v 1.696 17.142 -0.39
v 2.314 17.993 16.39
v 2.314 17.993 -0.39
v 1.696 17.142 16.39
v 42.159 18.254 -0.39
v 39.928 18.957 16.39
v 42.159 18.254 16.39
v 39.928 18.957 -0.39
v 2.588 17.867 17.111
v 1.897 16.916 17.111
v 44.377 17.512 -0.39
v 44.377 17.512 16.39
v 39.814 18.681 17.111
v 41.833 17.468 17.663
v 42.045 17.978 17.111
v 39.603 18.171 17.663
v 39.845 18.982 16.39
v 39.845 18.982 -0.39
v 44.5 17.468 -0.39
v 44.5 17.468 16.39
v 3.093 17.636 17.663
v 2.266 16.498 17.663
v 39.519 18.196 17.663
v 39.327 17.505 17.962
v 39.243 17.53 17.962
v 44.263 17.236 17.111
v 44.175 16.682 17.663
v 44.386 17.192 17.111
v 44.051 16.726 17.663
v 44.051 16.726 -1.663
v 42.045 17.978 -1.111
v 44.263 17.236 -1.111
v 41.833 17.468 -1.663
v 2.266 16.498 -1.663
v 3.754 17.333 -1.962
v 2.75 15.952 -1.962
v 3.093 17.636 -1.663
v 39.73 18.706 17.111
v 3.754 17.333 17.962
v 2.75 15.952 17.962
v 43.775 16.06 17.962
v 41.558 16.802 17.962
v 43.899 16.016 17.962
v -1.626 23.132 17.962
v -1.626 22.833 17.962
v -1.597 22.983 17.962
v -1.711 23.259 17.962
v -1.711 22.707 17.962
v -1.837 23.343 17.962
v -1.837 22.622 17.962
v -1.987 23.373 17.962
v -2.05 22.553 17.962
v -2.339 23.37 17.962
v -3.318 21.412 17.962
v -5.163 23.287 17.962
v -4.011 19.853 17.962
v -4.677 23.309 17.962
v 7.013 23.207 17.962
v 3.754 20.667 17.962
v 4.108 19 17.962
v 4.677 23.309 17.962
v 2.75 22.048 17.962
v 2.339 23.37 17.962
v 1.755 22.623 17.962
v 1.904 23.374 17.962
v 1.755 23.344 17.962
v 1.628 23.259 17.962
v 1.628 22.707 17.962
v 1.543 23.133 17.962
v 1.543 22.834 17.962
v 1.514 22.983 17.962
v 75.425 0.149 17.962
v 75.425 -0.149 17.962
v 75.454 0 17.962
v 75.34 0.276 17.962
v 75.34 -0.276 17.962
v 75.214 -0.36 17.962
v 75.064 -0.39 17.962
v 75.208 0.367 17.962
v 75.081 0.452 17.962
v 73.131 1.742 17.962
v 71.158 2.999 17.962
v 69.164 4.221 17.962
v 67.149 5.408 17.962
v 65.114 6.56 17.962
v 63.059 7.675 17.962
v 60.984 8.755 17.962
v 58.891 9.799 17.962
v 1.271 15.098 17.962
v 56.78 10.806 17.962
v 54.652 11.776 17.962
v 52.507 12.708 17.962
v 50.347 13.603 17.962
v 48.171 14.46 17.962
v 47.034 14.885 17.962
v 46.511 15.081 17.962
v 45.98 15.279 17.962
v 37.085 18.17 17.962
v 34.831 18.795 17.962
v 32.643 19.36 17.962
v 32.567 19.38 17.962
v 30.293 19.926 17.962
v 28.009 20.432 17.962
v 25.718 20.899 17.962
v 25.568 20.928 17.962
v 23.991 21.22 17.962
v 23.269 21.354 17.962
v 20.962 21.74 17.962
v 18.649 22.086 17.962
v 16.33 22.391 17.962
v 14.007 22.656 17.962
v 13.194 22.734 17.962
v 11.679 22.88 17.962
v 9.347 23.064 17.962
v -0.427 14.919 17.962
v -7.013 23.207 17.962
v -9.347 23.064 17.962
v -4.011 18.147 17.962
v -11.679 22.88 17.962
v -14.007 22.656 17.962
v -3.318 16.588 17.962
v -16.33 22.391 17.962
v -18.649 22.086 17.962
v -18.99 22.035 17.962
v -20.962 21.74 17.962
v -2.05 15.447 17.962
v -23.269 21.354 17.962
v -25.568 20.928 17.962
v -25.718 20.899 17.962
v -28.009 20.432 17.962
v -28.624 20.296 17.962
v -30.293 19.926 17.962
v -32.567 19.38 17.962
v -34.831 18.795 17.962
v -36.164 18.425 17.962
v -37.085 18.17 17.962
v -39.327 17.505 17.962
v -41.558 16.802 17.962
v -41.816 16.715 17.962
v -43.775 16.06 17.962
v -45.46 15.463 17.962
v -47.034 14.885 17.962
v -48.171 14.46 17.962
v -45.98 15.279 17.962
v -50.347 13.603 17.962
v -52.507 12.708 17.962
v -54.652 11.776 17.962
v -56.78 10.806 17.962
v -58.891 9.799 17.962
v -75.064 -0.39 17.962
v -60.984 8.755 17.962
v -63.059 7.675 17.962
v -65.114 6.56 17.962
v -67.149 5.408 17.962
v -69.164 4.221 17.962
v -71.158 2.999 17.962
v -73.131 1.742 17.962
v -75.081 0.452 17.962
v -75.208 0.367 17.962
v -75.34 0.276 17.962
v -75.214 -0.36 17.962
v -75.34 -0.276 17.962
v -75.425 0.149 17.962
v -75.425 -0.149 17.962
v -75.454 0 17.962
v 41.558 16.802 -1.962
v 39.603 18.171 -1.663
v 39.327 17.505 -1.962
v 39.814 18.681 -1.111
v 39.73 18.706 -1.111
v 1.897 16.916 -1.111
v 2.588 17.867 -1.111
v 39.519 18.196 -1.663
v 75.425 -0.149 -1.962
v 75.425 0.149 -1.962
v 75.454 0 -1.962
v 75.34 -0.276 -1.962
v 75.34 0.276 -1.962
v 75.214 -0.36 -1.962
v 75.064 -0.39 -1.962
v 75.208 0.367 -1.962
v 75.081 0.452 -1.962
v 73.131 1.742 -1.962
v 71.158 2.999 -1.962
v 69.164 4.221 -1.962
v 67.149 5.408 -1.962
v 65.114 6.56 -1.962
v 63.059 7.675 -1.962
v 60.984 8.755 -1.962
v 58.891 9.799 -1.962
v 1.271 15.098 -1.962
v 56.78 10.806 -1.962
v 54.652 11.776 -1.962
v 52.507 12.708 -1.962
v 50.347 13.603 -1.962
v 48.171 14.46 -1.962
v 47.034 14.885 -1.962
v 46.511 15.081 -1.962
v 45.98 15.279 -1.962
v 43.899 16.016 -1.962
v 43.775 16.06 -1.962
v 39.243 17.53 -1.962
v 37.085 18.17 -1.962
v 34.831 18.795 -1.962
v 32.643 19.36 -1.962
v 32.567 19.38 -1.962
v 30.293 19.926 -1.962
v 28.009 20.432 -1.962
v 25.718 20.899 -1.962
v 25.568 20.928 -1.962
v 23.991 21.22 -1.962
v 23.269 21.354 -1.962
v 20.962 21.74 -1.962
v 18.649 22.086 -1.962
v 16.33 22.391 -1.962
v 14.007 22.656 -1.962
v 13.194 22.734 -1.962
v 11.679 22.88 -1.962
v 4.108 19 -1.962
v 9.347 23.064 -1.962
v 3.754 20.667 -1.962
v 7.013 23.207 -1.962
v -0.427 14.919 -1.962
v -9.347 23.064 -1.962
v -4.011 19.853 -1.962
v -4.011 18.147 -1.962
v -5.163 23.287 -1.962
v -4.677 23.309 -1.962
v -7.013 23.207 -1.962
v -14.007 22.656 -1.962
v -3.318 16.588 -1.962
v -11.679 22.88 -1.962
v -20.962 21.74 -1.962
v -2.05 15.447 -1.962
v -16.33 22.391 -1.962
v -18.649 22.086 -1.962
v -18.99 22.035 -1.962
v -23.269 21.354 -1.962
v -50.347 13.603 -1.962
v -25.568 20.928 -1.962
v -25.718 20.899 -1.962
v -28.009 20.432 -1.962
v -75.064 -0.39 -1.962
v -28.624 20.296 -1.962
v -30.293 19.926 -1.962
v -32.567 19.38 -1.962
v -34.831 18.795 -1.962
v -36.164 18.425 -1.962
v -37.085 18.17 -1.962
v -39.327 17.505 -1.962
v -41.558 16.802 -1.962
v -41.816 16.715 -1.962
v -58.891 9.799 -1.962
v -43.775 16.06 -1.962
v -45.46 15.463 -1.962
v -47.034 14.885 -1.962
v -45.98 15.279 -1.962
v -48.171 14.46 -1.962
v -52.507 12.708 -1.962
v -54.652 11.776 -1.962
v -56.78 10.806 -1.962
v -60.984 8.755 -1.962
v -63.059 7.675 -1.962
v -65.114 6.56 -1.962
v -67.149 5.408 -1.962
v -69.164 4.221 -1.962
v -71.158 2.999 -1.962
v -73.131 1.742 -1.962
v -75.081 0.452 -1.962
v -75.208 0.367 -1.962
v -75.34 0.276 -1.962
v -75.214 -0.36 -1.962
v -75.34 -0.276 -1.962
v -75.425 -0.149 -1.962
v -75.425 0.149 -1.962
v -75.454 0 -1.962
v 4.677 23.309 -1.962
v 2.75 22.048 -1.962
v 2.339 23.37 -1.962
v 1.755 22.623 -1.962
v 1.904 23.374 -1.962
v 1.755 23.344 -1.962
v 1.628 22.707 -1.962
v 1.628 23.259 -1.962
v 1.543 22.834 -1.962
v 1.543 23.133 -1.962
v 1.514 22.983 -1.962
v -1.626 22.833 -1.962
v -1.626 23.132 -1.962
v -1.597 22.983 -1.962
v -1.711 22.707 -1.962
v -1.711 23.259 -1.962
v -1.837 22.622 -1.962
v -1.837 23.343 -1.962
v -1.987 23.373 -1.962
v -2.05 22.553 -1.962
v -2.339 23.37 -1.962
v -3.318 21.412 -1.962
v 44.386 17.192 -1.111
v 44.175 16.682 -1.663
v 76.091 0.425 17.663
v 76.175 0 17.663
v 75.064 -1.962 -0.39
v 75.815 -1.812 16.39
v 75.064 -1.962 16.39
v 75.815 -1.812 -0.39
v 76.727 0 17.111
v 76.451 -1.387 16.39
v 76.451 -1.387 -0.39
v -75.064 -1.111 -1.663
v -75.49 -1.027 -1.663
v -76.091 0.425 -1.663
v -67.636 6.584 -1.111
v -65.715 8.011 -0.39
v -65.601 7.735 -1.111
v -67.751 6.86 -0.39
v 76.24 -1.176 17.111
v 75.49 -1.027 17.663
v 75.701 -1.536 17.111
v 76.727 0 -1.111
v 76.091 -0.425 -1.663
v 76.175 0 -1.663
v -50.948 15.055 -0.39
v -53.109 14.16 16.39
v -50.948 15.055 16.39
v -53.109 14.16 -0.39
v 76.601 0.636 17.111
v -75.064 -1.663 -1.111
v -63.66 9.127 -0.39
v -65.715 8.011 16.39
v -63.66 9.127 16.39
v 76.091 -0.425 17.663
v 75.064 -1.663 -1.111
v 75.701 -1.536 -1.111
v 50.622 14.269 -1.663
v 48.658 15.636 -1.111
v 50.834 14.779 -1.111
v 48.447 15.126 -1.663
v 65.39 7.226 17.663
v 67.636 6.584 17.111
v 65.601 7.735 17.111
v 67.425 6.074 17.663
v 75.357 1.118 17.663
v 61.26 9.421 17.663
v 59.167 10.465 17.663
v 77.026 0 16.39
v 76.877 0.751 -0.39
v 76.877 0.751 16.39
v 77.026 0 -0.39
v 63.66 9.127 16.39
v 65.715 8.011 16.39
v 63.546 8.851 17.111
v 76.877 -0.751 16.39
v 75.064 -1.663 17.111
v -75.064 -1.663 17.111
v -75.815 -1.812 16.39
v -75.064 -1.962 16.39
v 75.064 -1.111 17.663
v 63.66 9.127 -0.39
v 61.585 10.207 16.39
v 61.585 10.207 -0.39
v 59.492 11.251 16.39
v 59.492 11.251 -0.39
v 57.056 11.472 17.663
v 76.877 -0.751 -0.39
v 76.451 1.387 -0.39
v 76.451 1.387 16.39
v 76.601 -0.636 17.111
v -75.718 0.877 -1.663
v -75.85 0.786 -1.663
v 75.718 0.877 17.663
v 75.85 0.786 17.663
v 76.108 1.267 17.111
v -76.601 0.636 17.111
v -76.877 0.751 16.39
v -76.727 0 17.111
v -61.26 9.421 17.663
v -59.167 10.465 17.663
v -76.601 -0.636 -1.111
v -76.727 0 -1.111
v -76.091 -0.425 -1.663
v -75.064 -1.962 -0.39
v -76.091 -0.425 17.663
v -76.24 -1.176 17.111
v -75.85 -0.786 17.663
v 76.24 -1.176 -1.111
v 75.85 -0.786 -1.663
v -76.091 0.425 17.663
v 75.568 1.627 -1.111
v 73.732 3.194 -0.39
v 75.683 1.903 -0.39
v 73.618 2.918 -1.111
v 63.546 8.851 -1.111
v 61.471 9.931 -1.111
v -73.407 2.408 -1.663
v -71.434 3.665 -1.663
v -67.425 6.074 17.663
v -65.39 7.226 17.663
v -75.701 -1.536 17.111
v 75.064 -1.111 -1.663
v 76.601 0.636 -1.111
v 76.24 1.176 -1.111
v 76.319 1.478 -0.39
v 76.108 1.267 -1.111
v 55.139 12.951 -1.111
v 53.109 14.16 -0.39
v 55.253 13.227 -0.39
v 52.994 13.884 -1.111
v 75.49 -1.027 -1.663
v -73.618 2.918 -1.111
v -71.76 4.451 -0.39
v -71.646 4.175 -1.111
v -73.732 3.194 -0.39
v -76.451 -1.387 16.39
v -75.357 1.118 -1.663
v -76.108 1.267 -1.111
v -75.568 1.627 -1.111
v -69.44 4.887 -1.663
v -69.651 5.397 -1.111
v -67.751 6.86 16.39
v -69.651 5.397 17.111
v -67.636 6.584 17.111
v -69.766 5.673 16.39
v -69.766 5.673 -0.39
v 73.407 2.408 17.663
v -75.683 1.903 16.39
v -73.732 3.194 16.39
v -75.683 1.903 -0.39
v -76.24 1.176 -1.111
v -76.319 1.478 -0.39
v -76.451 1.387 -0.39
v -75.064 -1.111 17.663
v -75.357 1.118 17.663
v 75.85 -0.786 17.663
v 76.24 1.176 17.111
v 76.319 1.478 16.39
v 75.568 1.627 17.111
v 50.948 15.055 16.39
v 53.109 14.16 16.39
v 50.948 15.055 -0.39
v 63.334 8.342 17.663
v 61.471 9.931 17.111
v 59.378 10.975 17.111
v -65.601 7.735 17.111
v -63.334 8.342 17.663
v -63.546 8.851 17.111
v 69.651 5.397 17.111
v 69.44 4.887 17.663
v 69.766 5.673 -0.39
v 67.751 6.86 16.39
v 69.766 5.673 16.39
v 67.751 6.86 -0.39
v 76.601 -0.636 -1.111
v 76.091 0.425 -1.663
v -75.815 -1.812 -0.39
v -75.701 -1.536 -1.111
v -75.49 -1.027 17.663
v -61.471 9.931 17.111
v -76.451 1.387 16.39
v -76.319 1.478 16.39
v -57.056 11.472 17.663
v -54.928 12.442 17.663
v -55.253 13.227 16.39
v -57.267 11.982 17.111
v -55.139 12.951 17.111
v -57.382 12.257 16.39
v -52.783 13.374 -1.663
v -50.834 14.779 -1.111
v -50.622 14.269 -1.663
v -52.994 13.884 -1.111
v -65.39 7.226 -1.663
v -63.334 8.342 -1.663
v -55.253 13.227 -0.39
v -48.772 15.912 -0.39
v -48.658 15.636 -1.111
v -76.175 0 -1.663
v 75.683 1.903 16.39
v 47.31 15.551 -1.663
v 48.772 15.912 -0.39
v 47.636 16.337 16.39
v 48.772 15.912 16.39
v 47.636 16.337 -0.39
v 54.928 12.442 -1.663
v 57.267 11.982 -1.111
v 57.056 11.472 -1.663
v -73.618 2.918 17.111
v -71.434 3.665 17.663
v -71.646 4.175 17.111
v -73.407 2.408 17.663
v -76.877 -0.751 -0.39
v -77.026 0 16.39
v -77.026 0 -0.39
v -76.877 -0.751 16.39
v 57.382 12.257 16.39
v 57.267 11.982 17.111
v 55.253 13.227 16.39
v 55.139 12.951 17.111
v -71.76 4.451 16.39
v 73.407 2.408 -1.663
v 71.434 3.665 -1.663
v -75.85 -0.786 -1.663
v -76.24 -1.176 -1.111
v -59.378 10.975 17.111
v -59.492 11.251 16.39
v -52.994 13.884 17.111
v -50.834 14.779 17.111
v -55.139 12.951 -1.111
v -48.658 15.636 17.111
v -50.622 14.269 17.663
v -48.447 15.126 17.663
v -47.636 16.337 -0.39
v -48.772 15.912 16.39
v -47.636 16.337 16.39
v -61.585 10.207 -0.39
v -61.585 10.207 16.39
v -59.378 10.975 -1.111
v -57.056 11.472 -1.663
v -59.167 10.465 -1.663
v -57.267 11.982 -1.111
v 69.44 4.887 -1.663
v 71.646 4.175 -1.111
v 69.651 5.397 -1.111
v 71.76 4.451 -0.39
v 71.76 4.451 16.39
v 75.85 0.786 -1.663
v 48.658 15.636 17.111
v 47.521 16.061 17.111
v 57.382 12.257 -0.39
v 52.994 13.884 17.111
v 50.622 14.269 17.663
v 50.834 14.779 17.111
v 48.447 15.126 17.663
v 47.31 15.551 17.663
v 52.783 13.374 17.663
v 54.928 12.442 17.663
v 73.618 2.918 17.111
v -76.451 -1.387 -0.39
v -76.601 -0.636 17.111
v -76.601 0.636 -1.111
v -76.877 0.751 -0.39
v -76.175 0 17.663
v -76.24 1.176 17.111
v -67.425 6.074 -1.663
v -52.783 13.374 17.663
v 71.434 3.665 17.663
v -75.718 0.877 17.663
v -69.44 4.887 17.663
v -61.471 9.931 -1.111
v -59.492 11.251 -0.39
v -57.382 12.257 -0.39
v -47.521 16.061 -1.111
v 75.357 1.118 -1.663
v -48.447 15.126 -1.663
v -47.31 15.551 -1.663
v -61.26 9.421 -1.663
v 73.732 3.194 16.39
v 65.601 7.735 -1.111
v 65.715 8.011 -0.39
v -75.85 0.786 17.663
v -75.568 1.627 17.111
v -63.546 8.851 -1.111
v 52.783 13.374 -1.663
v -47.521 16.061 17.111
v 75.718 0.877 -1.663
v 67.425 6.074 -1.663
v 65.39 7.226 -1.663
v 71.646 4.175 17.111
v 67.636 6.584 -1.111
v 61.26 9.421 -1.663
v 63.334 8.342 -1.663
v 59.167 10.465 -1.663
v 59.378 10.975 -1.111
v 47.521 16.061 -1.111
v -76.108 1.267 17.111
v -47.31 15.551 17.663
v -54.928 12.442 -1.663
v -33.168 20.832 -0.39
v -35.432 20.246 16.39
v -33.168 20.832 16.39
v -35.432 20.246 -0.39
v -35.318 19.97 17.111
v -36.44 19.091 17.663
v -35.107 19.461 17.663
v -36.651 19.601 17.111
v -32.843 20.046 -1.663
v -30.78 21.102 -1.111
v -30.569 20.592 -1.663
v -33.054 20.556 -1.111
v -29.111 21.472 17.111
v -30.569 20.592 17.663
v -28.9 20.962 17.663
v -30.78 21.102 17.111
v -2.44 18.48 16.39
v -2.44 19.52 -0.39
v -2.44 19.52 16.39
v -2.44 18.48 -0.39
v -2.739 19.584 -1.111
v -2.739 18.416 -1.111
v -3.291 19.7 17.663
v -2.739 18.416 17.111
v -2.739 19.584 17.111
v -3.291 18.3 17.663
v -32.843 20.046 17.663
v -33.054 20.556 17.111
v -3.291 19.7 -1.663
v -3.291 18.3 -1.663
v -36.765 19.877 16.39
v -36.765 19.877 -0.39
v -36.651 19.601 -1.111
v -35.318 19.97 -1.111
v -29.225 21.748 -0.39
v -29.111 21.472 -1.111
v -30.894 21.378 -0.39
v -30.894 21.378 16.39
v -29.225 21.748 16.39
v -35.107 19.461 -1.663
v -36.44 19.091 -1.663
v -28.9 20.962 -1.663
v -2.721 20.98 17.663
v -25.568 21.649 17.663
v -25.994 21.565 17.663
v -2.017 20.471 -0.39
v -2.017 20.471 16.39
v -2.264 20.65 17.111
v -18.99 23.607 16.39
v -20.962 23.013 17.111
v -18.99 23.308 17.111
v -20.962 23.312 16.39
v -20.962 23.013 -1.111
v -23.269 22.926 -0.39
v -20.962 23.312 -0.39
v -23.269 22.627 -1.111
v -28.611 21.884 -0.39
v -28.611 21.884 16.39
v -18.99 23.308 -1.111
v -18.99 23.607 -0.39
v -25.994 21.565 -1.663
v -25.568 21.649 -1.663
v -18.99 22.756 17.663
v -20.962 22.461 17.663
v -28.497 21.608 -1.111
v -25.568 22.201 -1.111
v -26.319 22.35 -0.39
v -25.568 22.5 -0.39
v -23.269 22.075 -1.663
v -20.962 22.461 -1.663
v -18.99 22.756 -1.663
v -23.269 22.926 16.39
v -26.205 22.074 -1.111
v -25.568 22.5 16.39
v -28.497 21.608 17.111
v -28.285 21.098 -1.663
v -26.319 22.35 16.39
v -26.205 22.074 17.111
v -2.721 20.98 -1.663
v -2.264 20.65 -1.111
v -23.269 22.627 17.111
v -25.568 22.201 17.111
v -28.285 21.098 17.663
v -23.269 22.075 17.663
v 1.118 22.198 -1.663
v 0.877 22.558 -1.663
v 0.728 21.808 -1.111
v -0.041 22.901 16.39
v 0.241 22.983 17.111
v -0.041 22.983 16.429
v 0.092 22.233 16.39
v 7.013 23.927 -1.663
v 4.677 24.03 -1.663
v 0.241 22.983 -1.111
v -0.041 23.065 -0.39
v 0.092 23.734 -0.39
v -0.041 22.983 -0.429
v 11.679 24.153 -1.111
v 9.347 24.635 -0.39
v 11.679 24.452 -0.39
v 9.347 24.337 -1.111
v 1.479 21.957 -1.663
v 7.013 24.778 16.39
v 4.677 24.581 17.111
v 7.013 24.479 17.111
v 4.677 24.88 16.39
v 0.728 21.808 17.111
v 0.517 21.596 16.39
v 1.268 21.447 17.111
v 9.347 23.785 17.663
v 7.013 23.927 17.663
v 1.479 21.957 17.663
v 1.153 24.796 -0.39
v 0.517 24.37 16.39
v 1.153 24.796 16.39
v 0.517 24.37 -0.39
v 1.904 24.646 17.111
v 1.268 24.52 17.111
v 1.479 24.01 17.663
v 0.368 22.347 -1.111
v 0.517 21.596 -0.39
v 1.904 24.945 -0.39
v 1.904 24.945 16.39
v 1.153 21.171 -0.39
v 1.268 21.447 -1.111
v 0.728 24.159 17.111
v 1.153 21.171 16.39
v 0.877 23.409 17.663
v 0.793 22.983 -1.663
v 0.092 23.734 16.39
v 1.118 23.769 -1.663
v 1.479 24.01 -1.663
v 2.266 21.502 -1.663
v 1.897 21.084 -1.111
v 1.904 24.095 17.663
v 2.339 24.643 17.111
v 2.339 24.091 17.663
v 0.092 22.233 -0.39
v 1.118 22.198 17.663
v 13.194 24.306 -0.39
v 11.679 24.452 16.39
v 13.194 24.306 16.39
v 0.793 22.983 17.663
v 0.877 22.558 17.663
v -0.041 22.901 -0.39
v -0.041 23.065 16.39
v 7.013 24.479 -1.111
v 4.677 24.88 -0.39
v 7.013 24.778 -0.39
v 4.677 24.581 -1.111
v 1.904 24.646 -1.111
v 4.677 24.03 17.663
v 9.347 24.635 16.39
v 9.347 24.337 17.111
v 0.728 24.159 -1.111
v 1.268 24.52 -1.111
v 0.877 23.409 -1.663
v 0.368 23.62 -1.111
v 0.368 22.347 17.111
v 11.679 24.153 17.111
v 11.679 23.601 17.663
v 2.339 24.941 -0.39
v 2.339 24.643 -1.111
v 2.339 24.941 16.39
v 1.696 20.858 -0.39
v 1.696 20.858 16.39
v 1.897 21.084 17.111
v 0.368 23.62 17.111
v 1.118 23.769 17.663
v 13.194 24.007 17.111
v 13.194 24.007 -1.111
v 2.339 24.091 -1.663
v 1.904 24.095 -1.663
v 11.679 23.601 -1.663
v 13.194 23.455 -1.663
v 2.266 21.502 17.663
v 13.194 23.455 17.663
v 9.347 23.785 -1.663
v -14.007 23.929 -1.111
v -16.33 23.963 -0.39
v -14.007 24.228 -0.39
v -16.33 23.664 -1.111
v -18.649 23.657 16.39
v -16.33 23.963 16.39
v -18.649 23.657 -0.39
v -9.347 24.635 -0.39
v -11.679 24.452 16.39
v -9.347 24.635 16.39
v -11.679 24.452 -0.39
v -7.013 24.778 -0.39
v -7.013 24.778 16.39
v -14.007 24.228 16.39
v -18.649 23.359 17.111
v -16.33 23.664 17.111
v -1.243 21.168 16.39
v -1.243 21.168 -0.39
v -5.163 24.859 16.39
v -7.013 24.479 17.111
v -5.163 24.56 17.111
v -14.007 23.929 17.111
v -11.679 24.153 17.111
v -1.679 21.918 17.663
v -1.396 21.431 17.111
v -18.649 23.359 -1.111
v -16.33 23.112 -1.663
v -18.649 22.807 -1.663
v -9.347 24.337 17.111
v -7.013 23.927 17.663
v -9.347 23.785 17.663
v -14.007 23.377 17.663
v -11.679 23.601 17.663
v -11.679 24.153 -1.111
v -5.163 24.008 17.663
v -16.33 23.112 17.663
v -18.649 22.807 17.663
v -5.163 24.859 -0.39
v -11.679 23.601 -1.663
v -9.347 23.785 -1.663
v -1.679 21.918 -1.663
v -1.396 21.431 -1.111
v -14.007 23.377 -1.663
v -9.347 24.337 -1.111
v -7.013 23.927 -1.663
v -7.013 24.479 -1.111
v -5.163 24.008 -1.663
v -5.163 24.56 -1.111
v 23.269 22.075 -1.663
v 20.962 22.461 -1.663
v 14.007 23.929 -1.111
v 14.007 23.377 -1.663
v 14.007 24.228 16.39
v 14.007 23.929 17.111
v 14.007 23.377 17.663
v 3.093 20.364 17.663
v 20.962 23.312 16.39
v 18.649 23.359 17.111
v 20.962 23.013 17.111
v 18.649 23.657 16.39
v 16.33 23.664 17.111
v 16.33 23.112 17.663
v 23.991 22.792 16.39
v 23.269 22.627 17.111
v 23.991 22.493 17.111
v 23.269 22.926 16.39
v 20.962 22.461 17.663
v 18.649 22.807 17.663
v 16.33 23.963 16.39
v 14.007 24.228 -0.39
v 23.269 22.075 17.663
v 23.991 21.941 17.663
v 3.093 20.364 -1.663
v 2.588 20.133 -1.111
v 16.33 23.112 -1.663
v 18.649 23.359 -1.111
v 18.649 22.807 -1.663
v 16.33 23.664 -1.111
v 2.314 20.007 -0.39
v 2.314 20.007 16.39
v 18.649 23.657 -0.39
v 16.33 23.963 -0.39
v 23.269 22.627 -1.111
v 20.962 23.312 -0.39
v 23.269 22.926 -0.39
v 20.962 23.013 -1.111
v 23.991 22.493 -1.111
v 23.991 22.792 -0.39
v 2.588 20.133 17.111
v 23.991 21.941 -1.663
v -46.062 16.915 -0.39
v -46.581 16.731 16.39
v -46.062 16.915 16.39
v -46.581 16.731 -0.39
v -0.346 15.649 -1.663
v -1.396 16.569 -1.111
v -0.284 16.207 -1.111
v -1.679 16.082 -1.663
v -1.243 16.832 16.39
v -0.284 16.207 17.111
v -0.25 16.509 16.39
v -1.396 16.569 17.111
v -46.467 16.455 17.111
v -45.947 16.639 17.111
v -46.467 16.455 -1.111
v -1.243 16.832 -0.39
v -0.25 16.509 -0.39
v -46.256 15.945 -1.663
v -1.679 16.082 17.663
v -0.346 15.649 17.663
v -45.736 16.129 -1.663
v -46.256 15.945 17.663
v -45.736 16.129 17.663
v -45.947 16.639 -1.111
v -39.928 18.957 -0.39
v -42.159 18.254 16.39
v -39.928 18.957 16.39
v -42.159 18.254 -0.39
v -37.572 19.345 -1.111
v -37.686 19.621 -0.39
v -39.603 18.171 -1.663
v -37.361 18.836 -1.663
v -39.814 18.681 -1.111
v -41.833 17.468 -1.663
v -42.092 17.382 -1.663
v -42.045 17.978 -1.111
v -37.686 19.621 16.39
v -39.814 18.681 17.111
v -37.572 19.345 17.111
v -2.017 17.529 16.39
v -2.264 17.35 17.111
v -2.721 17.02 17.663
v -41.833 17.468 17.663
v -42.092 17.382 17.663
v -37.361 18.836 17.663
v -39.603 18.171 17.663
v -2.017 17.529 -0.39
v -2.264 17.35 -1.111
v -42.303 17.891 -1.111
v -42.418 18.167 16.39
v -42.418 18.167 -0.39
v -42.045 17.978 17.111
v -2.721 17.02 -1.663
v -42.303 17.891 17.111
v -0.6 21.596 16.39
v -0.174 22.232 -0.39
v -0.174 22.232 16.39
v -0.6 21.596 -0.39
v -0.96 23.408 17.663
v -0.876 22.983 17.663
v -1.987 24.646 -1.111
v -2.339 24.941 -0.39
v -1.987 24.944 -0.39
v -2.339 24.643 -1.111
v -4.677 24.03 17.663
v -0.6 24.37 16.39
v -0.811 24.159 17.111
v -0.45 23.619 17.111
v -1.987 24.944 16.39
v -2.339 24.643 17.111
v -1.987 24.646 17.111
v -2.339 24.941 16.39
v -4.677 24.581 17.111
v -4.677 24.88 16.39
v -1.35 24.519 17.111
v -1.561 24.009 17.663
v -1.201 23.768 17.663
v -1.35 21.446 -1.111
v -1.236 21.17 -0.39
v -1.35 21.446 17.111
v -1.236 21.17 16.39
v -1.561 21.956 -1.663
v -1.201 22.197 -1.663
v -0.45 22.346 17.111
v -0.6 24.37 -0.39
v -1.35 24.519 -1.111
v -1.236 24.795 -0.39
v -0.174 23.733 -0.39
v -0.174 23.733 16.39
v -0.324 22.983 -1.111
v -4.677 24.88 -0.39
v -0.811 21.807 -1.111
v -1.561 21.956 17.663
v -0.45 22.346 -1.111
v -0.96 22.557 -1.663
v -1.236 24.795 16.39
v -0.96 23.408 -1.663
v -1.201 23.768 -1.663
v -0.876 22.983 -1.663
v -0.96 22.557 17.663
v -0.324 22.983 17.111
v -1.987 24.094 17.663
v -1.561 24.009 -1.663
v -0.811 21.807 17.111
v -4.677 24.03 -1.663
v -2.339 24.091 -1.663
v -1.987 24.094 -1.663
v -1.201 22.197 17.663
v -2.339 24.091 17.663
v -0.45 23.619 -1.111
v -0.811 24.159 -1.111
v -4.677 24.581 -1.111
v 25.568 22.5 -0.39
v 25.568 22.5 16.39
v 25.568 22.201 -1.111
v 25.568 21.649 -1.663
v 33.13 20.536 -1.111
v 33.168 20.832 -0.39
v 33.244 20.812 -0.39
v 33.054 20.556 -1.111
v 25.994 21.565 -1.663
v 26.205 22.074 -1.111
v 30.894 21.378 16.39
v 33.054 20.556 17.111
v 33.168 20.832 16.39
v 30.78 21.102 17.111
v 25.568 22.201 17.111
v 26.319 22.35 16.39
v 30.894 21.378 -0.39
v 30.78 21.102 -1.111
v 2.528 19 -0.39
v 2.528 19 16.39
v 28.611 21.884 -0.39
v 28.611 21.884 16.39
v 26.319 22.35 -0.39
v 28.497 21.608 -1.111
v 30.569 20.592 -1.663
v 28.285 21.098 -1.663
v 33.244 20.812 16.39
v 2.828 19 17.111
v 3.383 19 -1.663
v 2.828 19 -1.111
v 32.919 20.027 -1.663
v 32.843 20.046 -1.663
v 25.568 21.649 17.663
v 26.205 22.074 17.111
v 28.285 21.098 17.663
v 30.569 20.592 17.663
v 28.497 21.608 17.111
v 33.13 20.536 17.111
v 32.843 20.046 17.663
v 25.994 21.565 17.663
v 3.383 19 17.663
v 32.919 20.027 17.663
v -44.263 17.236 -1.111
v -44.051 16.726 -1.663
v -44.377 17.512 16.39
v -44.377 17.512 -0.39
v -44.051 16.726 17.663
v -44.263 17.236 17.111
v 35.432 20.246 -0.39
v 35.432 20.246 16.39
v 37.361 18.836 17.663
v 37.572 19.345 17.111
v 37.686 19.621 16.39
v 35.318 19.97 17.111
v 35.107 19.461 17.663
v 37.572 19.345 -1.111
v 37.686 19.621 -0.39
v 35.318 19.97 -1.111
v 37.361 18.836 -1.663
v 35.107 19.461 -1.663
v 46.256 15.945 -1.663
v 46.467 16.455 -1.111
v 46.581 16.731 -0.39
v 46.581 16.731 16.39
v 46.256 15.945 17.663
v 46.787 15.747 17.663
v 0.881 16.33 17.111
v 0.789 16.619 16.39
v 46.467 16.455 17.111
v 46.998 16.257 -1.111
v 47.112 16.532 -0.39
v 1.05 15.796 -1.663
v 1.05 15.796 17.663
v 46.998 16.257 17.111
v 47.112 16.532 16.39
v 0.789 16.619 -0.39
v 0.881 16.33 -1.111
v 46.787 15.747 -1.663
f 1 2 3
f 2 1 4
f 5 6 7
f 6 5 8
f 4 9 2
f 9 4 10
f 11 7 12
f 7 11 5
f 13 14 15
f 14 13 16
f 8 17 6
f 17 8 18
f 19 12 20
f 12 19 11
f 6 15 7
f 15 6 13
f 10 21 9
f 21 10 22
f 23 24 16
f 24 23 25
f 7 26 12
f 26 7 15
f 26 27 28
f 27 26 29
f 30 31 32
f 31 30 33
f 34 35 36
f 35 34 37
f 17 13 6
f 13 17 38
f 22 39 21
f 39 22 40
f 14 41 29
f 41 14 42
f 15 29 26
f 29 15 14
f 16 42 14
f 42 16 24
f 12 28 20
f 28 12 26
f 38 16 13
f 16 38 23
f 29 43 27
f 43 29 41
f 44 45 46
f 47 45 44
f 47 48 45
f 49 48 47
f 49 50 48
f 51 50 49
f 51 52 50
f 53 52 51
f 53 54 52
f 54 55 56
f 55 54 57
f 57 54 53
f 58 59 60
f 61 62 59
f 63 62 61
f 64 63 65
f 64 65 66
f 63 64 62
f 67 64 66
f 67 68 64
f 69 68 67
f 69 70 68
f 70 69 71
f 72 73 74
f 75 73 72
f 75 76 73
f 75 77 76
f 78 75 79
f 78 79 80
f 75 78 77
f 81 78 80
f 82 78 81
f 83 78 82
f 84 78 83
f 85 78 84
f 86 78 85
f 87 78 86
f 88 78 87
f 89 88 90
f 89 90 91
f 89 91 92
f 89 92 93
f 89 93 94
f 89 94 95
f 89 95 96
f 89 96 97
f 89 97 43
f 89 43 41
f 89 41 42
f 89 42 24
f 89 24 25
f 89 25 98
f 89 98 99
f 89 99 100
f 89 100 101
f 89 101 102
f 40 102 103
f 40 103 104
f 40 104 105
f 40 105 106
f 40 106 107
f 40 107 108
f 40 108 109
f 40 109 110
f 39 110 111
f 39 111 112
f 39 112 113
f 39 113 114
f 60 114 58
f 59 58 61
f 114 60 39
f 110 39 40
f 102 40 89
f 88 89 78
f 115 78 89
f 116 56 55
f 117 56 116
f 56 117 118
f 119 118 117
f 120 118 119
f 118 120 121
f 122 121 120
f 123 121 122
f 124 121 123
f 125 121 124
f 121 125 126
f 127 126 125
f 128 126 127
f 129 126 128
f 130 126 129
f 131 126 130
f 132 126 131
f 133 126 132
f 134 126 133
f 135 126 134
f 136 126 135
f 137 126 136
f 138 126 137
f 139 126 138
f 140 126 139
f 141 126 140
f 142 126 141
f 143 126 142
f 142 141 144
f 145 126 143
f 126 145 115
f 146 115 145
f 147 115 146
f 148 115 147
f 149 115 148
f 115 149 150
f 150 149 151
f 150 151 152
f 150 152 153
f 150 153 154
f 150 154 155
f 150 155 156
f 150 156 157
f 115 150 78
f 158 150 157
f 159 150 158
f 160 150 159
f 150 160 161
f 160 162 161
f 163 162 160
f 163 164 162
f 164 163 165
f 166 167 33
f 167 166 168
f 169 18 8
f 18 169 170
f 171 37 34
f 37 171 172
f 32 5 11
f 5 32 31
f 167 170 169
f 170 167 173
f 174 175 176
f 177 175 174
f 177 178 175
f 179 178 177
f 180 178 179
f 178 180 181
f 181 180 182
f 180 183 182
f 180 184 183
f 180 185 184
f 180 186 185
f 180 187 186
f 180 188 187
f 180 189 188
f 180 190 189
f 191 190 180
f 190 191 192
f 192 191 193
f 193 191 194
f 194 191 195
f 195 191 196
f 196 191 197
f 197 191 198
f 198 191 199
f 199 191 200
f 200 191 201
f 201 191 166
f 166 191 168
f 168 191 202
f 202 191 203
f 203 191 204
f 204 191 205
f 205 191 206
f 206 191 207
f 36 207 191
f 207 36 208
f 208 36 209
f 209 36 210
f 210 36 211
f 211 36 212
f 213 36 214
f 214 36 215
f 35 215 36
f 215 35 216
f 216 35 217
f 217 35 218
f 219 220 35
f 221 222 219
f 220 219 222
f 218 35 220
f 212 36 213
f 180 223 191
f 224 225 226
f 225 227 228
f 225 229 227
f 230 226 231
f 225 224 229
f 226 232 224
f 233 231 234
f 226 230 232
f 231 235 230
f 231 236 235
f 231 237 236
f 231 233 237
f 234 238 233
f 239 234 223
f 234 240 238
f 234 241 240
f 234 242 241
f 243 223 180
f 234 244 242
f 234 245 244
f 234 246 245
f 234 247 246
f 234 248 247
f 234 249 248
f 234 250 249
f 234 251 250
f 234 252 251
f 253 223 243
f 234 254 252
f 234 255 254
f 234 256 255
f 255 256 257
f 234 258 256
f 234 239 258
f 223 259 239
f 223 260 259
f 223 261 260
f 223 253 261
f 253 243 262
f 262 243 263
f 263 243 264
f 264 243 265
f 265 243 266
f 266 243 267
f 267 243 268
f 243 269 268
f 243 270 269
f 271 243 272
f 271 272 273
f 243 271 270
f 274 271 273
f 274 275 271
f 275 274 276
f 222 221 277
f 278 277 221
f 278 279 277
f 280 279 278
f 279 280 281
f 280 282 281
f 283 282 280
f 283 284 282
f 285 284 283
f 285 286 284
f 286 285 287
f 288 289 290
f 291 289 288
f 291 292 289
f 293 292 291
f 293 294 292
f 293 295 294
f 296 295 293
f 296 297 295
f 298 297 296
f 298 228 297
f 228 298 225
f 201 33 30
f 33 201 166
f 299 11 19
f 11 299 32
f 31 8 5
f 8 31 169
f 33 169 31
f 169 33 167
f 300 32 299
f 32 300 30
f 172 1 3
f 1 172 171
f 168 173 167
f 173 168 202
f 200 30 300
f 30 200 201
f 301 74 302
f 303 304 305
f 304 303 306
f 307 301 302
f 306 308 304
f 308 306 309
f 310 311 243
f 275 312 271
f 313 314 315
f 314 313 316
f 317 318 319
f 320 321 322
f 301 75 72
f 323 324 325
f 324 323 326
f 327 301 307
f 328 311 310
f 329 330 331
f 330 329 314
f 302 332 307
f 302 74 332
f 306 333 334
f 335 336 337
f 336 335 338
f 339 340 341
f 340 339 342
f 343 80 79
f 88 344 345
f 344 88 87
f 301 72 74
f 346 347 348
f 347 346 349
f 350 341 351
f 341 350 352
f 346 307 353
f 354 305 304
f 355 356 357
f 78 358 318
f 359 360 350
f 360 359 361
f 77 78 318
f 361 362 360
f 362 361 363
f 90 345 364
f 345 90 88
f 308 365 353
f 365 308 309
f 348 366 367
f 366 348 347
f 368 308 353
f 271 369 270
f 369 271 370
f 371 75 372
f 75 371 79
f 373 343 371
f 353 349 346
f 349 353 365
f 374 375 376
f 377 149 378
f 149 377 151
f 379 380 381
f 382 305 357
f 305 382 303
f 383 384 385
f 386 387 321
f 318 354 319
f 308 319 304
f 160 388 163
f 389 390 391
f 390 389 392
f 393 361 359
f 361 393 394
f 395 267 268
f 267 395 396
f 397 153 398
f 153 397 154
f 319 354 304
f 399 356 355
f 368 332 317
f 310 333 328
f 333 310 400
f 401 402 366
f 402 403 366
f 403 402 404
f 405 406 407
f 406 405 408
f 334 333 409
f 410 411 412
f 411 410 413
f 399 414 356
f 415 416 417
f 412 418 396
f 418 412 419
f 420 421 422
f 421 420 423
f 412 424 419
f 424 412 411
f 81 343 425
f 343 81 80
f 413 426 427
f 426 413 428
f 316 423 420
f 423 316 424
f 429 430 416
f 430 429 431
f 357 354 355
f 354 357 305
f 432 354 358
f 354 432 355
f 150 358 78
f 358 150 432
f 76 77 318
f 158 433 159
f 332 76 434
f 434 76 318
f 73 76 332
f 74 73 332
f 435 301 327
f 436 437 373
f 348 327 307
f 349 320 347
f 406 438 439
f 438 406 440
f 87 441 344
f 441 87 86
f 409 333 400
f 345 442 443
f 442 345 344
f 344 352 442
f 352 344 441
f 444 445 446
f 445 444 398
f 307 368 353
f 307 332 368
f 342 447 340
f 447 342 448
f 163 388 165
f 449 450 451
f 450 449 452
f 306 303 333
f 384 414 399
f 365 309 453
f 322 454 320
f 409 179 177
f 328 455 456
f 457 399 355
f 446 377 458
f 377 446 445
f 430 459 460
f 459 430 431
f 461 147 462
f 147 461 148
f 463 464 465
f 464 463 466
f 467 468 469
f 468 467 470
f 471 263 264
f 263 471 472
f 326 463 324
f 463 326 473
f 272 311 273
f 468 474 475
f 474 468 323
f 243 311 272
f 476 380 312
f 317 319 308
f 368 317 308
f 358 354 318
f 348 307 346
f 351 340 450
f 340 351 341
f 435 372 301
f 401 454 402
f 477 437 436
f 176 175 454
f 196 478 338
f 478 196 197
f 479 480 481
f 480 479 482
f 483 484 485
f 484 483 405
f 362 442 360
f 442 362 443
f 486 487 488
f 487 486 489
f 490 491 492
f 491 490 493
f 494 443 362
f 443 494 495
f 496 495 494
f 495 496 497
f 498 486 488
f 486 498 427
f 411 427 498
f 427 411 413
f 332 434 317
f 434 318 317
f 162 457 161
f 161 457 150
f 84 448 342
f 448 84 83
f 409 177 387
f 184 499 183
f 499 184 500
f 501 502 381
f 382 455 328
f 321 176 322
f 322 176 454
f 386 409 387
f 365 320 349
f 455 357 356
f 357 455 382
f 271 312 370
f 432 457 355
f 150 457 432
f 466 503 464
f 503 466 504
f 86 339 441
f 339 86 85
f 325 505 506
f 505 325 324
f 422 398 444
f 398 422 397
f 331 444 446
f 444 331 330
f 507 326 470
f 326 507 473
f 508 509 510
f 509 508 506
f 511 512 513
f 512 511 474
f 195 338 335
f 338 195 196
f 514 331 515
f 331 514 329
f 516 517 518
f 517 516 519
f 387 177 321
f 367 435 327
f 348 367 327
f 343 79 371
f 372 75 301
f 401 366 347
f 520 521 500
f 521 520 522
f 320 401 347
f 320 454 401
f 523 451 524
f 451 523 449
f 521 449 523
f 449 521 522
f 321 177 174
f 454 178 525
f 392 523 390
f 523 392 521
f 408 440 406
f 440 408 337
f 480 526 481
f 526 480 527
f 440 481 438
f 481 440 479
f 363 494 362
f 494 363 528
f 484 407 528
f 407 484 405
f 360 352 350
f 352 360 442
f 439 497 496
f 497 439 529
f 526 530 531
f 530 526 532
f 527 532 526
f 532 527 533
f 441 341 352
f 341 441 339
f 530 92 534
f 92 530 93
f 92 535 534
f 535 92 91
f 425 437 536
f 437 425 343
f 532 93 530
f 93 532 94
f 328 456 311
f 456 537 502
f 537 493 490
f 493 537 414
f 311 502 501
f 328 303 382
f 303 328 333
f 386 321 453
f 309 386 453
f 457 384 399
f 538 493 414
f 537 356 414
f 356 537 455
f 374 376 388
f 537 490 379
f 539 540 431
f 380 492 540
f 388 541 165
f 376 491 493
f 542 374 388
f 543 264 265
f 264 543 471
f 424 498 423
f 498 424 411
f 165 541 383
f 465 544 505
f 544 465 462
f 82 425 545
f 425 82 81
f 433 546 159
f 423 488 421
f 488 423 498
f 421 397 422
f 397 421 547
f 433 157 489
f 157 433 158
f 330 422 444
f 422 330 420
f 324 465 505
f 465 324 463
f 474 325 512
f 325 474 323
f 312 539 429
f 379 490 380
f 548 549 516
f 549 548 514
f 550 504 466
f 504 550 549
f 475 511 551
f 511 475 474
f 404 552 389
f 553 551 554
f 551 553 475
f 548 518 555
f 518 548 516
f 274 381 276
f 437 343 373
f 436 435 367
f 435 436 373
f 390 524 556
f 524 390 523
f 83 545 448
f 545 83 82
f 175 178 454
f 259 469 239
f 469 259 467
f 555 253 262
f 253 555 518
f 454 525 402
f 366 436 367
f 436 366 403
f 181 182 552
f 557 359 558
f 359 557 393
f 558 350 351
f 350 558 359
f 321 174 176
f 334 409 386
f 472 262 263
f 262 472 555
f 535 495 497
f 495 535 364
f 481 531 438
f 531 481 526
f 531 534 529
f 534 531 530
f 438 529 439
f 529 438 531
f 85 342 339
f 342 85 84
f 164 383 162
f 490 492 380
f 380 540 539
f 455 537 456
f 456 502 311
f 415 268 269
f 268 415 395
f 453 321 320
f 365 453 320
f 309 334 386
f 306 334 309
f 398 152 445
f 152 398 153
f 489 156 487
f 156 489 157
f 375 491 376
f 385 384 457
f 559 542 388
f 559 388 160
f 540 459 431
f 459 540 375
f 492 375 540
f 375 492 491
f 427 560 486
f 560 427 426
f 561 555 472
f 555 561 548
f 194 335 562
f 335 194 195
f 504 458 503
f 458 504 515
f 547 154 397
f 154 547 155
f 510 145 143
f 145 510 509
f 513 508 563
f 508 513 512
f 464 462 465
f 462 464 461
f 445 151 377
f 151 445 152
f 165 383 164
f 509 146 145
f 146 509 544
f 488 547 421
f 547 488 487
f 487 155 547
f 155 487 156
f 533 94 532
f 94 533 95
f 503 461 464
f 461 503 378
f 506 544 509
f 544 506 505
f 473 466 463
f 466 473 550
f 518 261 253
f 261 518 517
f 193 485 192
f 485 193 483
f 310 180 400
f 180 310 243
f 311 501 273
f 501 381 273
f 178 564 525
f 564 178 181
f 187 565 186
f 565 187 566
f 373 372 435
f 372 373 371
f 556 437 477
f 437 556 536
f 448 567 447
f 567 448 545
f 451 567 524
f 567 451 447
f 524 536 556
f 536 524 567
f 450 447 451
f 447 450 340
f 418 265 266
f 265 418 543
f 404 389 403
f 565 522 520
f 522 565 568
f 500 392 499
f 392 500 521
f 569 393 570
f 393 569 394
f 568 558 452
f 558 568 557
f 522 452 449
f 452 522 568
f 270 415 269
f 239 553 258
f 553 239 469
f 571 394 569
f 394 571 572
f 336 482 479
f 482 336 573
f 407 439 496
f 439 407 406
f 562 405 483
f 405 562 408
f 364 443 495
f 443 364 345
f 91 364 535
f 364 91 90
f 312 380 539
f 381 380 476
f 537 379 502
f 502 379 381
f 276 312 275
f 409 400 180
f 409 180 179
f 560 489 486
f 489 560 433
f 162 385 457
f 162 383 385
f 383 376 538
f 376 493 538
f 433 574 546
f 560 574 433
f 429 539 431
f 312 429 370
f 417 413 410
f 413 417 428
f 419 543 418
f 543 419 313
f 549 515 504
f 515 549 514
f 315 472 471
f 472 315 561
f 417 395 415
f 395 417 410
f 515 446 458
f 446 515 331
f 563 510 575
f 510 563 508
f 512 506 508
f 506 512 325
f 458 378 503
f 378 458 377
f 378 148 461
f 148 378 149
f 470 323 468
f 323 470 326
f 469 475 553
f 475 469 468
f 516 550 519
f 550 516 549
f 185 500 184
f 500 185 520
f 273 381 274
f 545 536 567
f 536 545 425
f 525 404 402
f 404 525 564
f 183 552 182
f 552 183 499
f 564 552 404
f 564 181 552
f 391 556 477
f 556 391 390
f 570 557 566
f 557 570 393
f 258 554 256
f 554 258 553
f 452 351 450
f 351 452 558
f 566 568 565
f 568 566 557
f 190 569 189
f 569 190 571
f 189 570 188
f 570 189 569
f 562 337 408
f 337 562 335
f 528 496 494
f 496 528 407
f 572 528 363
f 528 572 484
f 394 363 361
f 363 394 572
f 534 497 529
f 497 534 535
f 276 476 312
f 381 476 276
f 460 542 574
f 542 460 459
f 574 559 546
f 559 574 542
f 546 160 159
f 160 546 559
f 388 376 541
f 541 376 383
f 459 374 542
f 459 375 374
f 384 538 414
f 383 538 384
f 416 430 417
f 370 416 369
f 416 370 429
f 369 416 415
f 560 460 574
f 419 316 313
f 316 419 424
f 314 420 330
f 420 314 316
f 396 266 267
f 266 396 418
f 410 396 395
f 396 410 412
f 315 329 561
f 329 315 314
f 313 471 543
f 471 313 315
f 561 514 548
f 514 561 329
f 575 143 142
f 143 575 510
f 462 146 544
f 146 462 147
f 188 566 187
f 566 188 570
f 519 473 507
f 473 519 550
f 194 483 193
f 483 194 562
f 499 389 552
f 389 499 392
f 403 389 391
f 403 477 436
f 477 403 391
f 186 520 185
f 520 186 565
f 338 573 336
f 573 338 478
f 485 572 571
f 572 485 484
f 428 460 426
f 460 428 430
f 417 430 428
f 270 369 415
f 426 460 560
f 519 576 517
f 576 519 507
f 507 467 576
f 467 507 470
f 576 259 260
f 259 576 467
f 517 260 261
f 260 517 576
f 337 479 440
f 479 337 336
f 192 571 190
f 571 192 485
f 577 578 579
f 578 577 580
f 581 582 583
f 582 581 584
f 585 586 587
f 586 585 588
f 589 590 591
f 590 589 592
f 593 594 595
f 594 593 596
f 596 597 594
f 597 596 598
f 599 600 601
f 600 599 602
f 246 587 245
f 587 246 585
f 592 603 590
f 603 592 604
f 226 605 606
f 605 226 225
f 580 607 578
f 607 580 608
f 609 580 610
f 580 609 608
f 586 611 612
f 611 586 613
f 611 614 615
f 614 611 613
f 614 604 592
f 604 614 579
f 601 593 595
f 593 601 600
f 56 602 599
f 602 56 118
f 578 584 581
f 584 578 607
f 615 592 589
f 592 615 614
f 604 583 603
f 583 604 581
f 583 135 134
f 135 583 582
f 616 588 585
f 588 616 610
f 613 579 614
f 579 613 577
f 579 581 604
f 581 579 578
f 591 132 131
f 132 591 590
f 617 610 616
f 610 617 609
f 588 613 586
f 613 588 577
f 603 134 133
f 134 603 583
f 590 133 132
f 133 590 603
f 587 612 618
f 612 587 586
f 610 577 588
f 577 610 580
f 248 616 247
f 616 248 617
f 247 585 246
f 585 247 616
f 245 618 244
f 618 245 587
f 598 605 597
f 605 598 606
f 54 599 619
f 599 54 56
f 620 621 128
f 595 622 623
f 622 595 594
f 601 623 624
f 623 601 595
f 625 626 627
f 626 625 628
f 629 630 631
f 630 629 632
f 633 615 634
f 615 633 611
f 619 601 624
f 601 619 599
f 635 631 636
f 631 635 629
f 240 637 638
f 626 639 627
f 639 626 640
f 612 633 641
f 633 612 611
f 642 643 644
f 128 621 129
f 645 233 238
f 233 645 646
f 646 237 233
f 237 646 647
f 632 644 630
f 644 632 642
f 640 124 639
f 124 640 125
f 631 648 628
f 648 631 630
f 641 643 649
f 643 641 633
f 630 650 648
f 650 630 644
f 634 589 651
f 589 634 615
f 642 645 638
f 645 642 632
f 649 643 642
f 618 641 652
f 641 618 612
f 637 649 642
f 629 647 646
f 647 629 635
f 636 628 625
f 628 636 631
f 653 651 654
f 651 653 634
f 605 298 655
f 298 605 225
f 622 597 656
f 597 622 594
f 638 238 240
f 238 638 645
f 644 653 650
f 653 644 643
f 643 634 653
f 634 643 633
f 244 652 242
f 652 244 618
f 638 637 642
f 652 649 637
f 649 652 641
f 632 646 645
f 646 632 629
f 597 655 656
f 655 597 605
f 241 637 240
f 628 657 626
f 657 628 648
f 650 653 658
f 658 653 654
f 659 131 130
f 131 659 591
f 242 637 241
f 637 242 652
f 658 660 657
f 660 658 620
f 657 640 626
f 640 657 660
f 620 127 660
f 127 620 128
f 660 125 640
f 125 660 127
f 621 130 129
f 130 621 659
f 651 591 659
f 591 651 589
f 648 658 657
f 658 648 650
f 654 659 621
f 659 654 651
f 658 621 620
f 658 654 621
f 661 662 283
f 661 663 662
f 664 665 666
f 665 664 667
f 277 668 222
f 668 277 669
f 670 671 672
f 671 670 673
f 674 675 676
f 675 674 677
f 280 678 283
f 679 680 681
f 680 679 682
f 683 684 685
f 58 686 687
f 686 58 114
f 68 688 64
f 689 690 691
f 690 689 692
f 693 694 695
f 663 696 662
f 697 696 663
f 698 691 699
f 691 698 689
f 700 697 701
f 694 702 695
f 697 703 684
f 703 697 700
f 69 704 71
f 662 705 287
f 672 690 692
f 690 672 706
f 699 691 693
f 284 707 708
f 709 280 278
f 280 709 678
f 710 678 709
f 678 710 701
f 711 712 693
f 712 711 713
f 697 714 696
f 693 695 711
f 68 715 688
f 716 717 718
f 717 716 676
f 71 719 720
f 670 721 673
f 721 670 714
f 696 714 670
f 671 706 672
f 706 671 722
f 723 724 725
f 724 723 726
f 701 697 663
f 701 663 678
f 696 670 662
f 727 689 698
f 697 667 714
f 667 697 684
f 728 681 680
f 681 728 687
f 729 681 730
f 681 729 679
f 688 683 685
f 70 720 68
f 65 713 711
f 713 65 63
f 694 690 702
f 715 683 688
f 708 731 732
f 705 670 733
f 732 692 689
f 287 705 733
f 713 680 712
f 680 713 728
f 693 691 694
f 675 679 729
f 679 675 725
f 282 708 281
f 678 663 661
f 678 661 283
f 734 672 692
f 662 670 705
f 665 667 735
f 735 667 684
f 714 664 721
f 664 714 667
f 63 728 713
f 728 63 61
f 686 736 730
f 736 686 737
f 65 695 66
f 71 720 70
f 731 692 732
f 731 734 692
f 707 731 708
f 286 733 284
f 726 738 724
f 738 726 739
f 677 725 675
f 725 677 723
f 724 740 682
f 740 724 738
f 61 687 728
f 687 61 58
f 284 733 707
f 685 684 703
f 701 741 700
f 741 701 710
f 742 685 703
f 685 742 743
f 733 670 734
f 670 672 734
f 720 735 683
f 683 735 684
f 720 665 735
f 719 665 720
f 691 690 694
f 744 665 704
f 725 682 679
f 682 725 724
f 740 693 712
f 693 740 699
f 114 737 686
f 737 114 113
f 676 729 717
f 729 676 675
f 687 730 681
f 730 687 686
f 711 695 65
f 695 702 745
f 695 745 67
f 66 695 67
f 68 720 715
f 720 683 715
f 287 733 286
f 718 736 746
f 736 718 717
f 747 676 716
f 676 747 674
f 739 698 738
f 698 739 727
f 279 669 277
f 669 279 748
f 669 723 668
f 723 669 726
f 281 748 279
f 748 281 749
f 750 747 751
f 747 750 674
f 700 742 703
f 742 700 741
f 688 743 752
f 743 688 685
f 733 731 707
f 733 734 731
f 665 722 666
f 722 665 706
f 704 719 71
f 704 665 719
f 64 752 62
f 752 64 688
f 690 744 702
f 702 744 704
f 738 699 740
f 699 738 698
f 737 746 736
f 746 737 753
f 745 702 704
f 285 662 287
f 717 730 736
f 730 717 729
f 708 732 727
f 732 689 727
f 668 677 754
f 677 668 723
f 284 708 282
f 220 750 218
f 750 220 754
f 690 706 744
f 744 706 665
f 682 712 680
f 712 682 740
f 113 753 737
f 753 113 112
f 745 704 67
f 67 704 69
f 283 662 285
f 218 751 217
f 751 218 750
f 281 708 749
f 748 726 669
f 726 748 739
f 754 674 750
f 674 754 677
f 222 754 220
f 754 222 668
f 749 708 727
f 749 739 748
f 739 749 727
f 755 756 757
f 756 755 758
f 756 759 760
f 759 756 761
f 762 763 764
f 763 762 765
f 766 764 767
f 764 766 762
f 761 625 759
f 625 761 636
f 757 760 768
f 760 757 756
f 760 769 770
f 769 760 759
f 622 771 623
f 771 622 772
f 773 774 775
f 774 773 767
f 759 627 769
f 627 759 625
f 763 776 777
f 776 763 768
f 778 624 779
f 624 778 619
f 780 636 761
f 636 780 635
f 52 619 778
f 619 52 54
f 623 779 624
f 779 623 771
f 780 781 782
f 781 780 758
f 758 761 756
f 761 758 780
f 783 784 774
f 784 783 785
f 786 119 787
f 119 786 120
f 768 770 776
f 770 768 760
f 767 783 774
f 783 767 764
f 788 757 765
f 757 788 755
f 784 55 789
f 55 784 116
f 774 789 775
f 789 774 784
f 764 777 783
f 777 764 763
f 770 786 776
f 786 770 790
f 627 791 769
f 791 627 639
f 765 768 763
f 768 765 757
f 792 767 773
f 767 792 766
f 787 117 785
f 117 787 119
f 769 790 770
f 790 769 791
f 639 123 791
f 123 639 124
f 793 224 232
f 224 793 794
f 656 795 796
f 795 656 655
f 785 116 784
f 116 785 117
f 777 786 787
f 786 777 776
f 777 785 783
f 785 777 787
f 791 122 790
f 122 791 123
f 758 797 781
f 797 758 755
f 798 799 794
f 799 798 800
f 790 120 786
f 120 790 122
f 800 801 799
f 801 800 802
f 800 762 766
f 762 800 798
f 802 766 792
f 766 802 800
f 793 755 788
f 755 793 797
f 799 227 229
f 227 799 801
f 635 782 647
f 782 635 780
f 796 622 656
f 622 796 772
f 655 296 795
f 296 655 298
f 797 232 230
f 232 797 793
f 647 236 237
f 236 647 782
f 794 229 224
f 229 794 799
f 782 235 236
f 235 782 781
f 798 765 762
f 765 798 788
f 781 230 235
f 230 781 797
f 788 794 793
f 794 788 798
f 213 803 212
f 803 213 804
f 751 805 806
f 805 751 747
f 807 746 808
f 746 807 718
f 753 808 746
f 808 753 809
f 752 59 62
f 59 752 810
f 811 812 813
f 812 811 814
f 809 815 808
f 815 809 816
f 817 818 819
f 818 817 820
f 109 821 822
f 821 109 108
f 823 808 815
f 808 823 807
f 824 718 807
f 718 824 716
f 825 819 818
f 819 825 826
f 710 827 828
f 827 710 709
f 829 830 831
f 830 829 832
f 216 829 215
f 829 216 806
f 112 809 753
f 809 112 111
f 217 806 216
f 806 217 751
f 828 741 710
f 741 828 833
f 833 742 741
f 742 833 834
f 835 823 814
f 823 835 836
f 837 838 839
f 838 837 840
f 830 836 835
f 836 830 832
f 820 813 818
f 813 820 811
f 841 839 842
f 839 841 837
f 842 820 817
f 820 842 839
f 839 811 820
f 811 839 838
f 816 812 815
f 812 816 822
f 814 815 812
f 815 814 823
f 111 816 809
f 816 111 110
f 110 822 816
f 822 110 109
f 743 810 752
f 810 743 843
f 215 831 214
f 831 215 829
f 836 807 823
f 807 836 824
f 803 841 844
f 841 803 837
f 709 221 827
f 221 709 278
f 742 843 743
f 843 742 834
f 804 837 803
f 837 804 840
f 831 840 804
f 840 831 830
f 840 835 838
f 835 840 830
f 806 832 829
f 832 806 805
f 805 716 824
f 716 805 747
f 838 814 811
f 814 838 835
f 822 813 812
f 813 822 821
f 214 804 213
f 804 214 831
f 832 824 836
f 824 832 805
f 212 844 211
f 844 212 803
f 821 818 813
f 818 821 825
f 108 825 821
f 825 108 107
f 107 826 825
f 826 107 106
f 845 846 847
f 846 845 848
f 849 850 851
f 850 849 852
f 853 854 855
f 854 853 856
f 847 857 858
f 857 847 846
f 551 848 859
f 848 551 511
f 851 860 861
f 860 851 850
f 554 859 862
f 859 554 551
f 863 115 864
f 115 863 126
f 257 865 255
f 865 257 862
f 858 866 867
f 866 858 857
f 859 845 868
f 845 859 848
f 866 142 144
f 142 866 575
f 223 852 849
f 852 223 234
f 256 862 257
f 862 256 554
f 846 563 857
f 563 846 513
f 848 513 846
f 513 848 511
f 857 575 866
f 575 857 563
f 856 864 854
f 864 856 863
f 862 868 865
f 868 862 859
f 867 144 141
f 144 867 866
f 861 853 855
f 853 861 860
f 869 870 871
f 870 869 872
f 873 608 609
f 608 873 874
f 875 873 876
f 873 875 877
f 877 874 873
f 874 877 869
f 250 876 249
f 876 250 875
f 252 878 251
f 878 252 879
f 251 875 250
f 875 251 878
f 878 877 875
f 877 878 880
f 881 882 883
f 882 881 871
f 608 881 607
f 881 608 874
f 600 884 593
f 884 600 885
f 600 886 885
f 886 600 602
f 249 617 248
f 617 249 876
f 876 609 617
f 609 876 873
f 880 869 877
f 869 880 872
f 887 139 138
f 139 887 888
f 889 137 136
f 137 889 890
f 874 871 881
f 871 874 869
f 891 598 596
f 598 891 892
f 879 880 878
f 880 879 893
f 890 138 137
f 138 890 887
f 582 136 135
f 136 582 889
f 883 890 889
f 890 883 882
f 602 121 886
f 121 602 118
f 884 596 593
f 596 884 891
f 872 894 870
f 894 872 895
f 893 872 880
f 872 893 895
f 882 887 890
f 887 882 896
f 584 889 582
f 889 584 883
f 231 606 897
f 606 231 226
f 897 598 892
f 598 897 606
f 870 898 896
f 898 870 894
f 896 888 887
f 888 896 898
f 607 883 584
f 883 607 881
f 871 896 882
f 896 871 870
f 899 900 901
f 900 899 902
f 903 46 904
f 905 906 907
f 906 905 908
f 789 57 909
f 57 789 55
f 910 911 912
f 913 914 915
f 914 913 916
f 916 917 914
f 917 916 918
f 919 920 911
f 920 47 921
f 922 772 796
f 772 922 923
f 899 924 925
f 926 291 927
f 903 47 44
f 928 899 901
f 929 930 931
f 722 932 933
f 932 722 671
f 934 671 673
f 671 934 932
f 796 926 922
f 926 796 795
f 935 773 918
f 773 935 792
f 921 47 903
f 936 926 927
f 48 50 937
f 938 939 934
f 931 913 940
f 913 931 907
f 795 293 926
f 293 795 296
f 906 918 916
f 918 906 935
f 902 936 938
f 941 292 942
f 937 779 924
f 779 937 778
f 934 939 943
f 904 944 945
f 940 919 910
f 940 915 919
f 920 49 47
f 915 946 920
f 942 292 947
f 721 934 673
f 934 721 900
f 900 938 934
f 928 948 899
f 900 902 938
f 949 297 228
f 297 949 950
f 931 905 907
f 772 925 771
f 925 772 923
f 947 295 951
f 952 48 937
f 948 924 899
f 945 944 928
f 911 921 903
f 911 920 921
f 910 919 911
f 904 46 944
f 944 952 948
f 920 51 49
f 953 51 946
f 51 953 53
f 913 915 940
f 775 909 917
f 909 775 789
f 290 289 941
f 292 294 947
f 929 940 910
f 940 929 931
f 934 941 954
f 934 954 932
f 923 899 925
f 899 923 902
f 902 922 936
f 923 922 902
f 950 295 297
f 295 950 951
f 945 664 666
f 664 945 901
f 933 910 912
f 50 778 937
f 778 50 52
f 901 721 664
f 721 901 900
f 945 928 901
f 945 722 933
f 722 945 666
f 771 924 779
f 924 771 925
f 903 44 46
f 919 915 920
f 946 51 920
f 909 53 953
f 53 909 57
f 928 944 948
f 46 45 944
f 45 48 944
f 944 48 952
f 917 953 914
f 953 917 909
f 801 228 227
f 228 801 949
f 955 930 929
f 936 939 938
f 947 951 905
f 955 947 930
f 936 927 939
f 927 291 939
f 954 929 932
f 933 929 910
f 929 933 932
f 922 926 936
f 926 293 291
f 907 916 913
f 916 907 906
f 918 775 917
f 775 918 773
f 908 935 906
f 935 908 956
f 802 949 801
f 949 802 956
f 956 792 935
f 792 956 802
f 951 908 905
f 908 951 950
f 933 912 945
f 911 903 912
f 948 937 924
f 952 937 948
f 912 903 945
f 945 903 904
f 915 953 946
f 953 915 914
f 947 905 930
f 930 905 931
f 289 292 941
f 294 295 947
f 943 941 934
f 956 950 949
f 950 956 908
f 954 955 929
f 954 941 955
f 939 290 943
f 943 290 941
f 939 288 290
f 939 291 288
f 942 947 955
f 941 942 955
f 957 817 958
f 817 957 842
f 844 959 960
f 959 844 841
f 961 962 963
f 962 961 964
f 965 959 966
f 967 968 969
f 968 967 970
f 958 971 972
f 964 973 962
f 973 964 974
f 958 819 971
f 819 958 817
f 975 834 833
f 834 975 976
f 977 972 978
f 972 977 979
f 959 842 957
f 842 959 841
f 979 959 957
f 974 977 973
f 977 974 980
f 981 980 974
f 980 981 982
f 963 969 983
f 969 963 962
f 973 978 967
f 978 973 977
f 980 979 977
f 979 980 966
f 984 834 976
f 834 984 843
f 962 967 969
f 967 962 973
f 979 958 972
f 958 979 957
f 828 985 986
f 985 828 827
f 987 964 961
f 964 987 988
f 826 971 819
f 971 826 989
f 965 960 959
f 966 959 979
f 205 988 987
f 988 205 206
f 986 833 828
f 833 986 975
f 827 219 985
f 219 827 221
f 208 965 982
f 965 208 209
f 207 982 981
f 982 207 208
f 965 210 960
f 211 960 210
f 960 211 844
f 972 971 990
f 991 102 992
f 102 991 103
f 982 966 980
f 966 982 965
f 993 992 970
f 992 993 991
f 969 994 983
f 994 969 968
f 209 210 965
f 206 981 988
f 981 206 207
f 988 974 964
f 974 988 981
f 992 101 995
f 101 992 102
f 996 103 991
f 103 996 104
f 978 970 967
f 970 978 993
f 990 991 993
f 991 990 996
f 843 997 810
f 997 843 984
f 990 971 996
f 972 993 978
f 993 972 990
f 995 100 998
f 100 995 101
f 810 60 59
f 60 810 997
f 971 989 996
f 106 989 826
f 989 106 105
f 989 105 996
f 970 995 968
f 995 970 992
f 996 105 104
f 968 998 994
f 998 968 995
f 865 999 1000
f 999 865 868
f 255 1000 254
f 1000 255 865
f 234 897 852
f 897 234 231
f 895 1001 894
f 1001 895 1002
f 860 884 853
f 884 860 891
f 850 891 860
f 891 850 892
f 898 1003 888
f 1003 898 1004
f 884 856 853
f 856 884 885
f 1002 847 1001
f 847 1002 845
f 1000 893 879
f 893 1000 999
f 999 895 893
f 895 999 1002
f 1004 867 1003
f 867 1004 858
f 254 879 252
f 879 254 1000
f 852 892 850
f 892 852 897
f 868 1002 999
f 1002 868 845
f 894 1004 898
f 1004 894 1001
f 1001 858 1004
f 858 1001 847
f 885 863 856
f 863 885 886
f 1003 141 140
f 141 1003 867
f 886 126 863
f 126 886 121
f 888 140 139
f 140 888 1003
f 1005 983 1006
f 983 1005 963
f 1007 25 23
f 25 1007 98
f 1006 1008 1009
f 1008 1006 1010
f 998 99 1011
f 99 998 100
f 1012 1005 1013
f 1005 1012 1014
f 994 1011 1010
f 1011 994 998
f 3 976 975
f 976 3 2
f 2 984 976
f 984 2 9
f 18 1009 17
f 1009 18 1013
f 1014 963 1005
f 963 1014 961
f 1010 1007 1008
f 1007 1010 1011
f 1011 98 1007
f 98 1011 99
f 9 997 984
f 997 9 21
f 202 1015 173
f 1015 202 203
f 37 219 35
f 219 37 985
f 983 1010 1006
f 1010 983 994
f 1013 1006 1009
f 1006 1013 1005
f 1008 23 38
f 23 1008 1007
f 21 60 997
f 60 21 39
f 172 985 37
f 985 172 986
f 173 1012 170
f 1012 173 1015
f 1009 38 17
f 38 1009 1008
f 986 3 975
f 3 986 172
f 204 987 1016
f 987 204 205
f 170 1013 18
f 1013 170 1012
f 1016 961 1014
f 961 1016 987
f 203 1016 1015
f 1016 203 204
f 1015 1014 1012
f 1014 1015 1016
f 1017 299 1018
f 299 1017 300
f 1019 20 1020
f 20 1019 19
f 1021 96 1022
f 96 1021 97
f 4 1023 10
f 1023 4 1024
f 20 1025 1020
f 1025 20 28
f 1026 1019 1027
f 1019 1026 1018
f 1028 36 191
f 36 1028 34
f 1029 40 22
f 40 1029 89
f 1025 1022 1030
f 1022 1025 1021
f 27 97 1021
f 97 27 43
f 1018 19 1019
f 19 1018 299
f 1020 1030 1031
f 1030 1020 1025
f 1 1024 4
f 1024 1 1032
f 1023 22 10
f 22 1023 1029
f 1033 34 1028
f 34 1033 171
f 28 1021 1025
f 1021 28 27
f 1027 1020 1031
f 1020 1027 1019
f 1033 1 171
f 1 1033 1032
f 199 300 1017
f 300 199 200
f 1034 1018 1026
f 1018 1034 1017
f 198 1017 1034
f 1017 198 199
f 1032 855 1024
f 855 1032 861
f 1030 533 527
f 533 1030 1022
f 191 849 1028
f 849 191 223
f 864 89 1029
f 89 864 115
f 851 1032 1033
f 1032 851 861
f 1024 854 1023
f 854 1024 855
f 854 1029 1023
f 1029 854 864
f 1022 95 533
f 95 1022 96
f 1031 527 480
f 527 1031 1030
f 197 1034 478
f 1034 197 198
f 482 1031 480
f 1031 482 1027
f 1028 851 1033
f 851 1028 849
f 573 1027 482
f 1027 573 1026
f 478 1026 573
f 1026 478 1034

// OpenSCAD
/* spacers for transcat cat door */

d1 = 272;  // glass hole
d2 = 260;  // screw hole circle (guess)
d3 = 235;  // surround ring ID
tt = 20; // thickness of glass panel
hh = 5; // M4 screw
ww = 25; // width

rr = 2; // radius for edges
$fa=1;

minkowski() {
intersection() {
    translate([-d1/2,0,0]) cube([d1,d1,tt]);
translate([0,-d1/2+ww,0]) { difference() {
        cylinder(d=d1-rr*2,h=tt-rr*2);
        translate([0,d2/2,-1]) cylinder(h=tt,d=hh+rr*2);
        }
        }
}
sphere(r=rr, $fn=16);
}
